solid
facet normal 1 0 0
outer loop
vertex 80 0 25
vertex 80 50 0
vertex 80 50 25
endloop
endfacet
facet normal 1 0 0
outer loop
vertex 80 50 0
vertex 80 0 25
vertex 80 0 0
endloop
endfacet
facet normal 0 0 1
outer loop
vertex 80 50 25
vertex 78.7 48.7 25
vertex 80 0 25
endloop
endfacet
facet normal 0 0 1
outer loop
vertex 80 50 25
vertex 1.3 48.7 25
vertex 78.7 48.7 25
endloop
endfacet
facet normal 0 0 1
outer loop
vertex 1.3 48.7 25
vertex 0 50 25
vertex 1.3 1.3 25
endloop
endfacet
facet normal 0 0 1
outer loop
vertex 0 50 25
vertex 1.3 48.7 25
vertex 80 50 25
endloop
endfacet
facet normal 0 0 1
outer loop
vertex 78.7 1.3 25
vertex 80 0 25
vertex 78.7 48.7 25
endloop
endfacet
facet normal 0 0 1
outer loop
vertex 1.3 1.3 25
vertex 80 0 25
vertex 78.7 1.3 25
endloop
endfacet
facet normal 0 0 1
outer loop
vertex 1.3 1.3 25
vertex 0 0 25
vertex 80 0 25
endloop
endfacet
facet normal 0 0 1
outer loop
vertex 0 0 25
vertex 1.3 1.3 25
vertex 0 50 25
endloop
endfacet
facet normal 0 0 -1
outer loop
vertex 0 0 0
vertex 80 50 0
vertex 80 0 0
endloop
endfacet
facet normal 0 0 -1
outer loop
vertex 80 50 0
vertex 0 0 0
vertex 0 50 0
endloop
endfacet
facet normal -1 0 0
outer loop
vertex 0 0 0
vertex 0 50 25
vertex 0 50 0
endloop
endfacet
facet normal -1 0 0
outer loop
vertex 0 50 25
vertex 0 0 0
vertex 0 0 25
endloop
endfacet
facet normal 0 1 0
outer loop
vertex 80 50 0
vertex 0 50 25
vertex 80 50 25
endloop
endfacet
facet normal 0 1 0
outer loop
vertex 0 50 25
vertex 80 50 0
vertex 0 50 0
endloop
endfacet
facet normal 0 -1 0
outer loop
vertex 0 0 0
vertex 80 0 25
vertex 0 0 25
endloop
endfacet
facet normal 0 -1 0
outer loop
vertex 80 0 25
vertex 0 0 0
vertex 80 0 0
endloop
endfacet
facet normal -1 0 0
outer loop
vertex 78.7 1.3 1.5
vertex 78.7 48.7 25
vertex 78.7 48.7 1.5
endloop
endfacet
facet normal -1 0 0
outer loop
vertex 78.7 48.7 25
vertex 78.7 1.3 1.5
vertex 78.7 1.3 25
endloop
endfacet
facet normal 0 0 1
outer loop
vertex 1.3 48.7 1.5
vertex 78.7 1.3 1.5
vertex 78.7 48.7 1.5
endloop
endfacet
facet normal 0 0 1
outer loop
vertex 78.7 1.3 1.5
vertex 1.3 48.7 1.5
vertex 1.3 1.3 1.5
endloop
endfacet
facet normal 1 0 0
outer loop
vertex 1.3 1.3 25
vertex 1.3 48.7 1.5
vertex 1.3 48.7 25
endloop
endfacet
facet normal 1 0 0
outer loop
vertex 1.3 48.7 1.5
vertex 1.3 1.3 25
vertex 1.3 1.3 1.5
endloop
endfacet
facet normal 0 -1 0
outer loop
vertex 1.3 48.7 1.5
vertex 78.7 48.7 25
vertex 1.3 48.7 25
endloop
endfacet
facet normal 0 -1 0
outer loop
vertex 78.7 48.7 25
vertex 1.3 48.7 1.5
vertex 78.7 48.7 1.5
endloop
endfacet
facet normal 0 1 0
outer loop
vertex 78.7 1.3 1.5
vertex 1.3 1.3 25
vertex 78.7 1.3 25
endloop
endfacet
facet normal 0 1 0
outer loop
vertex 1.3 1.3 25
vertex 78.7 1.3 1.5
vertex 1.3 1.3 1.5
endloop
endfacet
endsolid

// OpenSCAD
$fn = 32;

// ----------------------------------------------------------------------
// Open box: 1.3 mm walls
// ----------------------------------------------------------------------

// --- parameters (mm) ---
box_l = 80;               // outer length, X
box_w = 50;               // outer width, Y
box_h = 25;               // outer height, Z
wall = 1.3;               // wall thickness
floor = 1.5;              // floor thickness

difference() {
  cube([box_l, box_w, box_h]);
  translate([wall, wall, floor])
    cube([box_l - 2 * wall, box_w - 2 * wall, box_h]);
}
